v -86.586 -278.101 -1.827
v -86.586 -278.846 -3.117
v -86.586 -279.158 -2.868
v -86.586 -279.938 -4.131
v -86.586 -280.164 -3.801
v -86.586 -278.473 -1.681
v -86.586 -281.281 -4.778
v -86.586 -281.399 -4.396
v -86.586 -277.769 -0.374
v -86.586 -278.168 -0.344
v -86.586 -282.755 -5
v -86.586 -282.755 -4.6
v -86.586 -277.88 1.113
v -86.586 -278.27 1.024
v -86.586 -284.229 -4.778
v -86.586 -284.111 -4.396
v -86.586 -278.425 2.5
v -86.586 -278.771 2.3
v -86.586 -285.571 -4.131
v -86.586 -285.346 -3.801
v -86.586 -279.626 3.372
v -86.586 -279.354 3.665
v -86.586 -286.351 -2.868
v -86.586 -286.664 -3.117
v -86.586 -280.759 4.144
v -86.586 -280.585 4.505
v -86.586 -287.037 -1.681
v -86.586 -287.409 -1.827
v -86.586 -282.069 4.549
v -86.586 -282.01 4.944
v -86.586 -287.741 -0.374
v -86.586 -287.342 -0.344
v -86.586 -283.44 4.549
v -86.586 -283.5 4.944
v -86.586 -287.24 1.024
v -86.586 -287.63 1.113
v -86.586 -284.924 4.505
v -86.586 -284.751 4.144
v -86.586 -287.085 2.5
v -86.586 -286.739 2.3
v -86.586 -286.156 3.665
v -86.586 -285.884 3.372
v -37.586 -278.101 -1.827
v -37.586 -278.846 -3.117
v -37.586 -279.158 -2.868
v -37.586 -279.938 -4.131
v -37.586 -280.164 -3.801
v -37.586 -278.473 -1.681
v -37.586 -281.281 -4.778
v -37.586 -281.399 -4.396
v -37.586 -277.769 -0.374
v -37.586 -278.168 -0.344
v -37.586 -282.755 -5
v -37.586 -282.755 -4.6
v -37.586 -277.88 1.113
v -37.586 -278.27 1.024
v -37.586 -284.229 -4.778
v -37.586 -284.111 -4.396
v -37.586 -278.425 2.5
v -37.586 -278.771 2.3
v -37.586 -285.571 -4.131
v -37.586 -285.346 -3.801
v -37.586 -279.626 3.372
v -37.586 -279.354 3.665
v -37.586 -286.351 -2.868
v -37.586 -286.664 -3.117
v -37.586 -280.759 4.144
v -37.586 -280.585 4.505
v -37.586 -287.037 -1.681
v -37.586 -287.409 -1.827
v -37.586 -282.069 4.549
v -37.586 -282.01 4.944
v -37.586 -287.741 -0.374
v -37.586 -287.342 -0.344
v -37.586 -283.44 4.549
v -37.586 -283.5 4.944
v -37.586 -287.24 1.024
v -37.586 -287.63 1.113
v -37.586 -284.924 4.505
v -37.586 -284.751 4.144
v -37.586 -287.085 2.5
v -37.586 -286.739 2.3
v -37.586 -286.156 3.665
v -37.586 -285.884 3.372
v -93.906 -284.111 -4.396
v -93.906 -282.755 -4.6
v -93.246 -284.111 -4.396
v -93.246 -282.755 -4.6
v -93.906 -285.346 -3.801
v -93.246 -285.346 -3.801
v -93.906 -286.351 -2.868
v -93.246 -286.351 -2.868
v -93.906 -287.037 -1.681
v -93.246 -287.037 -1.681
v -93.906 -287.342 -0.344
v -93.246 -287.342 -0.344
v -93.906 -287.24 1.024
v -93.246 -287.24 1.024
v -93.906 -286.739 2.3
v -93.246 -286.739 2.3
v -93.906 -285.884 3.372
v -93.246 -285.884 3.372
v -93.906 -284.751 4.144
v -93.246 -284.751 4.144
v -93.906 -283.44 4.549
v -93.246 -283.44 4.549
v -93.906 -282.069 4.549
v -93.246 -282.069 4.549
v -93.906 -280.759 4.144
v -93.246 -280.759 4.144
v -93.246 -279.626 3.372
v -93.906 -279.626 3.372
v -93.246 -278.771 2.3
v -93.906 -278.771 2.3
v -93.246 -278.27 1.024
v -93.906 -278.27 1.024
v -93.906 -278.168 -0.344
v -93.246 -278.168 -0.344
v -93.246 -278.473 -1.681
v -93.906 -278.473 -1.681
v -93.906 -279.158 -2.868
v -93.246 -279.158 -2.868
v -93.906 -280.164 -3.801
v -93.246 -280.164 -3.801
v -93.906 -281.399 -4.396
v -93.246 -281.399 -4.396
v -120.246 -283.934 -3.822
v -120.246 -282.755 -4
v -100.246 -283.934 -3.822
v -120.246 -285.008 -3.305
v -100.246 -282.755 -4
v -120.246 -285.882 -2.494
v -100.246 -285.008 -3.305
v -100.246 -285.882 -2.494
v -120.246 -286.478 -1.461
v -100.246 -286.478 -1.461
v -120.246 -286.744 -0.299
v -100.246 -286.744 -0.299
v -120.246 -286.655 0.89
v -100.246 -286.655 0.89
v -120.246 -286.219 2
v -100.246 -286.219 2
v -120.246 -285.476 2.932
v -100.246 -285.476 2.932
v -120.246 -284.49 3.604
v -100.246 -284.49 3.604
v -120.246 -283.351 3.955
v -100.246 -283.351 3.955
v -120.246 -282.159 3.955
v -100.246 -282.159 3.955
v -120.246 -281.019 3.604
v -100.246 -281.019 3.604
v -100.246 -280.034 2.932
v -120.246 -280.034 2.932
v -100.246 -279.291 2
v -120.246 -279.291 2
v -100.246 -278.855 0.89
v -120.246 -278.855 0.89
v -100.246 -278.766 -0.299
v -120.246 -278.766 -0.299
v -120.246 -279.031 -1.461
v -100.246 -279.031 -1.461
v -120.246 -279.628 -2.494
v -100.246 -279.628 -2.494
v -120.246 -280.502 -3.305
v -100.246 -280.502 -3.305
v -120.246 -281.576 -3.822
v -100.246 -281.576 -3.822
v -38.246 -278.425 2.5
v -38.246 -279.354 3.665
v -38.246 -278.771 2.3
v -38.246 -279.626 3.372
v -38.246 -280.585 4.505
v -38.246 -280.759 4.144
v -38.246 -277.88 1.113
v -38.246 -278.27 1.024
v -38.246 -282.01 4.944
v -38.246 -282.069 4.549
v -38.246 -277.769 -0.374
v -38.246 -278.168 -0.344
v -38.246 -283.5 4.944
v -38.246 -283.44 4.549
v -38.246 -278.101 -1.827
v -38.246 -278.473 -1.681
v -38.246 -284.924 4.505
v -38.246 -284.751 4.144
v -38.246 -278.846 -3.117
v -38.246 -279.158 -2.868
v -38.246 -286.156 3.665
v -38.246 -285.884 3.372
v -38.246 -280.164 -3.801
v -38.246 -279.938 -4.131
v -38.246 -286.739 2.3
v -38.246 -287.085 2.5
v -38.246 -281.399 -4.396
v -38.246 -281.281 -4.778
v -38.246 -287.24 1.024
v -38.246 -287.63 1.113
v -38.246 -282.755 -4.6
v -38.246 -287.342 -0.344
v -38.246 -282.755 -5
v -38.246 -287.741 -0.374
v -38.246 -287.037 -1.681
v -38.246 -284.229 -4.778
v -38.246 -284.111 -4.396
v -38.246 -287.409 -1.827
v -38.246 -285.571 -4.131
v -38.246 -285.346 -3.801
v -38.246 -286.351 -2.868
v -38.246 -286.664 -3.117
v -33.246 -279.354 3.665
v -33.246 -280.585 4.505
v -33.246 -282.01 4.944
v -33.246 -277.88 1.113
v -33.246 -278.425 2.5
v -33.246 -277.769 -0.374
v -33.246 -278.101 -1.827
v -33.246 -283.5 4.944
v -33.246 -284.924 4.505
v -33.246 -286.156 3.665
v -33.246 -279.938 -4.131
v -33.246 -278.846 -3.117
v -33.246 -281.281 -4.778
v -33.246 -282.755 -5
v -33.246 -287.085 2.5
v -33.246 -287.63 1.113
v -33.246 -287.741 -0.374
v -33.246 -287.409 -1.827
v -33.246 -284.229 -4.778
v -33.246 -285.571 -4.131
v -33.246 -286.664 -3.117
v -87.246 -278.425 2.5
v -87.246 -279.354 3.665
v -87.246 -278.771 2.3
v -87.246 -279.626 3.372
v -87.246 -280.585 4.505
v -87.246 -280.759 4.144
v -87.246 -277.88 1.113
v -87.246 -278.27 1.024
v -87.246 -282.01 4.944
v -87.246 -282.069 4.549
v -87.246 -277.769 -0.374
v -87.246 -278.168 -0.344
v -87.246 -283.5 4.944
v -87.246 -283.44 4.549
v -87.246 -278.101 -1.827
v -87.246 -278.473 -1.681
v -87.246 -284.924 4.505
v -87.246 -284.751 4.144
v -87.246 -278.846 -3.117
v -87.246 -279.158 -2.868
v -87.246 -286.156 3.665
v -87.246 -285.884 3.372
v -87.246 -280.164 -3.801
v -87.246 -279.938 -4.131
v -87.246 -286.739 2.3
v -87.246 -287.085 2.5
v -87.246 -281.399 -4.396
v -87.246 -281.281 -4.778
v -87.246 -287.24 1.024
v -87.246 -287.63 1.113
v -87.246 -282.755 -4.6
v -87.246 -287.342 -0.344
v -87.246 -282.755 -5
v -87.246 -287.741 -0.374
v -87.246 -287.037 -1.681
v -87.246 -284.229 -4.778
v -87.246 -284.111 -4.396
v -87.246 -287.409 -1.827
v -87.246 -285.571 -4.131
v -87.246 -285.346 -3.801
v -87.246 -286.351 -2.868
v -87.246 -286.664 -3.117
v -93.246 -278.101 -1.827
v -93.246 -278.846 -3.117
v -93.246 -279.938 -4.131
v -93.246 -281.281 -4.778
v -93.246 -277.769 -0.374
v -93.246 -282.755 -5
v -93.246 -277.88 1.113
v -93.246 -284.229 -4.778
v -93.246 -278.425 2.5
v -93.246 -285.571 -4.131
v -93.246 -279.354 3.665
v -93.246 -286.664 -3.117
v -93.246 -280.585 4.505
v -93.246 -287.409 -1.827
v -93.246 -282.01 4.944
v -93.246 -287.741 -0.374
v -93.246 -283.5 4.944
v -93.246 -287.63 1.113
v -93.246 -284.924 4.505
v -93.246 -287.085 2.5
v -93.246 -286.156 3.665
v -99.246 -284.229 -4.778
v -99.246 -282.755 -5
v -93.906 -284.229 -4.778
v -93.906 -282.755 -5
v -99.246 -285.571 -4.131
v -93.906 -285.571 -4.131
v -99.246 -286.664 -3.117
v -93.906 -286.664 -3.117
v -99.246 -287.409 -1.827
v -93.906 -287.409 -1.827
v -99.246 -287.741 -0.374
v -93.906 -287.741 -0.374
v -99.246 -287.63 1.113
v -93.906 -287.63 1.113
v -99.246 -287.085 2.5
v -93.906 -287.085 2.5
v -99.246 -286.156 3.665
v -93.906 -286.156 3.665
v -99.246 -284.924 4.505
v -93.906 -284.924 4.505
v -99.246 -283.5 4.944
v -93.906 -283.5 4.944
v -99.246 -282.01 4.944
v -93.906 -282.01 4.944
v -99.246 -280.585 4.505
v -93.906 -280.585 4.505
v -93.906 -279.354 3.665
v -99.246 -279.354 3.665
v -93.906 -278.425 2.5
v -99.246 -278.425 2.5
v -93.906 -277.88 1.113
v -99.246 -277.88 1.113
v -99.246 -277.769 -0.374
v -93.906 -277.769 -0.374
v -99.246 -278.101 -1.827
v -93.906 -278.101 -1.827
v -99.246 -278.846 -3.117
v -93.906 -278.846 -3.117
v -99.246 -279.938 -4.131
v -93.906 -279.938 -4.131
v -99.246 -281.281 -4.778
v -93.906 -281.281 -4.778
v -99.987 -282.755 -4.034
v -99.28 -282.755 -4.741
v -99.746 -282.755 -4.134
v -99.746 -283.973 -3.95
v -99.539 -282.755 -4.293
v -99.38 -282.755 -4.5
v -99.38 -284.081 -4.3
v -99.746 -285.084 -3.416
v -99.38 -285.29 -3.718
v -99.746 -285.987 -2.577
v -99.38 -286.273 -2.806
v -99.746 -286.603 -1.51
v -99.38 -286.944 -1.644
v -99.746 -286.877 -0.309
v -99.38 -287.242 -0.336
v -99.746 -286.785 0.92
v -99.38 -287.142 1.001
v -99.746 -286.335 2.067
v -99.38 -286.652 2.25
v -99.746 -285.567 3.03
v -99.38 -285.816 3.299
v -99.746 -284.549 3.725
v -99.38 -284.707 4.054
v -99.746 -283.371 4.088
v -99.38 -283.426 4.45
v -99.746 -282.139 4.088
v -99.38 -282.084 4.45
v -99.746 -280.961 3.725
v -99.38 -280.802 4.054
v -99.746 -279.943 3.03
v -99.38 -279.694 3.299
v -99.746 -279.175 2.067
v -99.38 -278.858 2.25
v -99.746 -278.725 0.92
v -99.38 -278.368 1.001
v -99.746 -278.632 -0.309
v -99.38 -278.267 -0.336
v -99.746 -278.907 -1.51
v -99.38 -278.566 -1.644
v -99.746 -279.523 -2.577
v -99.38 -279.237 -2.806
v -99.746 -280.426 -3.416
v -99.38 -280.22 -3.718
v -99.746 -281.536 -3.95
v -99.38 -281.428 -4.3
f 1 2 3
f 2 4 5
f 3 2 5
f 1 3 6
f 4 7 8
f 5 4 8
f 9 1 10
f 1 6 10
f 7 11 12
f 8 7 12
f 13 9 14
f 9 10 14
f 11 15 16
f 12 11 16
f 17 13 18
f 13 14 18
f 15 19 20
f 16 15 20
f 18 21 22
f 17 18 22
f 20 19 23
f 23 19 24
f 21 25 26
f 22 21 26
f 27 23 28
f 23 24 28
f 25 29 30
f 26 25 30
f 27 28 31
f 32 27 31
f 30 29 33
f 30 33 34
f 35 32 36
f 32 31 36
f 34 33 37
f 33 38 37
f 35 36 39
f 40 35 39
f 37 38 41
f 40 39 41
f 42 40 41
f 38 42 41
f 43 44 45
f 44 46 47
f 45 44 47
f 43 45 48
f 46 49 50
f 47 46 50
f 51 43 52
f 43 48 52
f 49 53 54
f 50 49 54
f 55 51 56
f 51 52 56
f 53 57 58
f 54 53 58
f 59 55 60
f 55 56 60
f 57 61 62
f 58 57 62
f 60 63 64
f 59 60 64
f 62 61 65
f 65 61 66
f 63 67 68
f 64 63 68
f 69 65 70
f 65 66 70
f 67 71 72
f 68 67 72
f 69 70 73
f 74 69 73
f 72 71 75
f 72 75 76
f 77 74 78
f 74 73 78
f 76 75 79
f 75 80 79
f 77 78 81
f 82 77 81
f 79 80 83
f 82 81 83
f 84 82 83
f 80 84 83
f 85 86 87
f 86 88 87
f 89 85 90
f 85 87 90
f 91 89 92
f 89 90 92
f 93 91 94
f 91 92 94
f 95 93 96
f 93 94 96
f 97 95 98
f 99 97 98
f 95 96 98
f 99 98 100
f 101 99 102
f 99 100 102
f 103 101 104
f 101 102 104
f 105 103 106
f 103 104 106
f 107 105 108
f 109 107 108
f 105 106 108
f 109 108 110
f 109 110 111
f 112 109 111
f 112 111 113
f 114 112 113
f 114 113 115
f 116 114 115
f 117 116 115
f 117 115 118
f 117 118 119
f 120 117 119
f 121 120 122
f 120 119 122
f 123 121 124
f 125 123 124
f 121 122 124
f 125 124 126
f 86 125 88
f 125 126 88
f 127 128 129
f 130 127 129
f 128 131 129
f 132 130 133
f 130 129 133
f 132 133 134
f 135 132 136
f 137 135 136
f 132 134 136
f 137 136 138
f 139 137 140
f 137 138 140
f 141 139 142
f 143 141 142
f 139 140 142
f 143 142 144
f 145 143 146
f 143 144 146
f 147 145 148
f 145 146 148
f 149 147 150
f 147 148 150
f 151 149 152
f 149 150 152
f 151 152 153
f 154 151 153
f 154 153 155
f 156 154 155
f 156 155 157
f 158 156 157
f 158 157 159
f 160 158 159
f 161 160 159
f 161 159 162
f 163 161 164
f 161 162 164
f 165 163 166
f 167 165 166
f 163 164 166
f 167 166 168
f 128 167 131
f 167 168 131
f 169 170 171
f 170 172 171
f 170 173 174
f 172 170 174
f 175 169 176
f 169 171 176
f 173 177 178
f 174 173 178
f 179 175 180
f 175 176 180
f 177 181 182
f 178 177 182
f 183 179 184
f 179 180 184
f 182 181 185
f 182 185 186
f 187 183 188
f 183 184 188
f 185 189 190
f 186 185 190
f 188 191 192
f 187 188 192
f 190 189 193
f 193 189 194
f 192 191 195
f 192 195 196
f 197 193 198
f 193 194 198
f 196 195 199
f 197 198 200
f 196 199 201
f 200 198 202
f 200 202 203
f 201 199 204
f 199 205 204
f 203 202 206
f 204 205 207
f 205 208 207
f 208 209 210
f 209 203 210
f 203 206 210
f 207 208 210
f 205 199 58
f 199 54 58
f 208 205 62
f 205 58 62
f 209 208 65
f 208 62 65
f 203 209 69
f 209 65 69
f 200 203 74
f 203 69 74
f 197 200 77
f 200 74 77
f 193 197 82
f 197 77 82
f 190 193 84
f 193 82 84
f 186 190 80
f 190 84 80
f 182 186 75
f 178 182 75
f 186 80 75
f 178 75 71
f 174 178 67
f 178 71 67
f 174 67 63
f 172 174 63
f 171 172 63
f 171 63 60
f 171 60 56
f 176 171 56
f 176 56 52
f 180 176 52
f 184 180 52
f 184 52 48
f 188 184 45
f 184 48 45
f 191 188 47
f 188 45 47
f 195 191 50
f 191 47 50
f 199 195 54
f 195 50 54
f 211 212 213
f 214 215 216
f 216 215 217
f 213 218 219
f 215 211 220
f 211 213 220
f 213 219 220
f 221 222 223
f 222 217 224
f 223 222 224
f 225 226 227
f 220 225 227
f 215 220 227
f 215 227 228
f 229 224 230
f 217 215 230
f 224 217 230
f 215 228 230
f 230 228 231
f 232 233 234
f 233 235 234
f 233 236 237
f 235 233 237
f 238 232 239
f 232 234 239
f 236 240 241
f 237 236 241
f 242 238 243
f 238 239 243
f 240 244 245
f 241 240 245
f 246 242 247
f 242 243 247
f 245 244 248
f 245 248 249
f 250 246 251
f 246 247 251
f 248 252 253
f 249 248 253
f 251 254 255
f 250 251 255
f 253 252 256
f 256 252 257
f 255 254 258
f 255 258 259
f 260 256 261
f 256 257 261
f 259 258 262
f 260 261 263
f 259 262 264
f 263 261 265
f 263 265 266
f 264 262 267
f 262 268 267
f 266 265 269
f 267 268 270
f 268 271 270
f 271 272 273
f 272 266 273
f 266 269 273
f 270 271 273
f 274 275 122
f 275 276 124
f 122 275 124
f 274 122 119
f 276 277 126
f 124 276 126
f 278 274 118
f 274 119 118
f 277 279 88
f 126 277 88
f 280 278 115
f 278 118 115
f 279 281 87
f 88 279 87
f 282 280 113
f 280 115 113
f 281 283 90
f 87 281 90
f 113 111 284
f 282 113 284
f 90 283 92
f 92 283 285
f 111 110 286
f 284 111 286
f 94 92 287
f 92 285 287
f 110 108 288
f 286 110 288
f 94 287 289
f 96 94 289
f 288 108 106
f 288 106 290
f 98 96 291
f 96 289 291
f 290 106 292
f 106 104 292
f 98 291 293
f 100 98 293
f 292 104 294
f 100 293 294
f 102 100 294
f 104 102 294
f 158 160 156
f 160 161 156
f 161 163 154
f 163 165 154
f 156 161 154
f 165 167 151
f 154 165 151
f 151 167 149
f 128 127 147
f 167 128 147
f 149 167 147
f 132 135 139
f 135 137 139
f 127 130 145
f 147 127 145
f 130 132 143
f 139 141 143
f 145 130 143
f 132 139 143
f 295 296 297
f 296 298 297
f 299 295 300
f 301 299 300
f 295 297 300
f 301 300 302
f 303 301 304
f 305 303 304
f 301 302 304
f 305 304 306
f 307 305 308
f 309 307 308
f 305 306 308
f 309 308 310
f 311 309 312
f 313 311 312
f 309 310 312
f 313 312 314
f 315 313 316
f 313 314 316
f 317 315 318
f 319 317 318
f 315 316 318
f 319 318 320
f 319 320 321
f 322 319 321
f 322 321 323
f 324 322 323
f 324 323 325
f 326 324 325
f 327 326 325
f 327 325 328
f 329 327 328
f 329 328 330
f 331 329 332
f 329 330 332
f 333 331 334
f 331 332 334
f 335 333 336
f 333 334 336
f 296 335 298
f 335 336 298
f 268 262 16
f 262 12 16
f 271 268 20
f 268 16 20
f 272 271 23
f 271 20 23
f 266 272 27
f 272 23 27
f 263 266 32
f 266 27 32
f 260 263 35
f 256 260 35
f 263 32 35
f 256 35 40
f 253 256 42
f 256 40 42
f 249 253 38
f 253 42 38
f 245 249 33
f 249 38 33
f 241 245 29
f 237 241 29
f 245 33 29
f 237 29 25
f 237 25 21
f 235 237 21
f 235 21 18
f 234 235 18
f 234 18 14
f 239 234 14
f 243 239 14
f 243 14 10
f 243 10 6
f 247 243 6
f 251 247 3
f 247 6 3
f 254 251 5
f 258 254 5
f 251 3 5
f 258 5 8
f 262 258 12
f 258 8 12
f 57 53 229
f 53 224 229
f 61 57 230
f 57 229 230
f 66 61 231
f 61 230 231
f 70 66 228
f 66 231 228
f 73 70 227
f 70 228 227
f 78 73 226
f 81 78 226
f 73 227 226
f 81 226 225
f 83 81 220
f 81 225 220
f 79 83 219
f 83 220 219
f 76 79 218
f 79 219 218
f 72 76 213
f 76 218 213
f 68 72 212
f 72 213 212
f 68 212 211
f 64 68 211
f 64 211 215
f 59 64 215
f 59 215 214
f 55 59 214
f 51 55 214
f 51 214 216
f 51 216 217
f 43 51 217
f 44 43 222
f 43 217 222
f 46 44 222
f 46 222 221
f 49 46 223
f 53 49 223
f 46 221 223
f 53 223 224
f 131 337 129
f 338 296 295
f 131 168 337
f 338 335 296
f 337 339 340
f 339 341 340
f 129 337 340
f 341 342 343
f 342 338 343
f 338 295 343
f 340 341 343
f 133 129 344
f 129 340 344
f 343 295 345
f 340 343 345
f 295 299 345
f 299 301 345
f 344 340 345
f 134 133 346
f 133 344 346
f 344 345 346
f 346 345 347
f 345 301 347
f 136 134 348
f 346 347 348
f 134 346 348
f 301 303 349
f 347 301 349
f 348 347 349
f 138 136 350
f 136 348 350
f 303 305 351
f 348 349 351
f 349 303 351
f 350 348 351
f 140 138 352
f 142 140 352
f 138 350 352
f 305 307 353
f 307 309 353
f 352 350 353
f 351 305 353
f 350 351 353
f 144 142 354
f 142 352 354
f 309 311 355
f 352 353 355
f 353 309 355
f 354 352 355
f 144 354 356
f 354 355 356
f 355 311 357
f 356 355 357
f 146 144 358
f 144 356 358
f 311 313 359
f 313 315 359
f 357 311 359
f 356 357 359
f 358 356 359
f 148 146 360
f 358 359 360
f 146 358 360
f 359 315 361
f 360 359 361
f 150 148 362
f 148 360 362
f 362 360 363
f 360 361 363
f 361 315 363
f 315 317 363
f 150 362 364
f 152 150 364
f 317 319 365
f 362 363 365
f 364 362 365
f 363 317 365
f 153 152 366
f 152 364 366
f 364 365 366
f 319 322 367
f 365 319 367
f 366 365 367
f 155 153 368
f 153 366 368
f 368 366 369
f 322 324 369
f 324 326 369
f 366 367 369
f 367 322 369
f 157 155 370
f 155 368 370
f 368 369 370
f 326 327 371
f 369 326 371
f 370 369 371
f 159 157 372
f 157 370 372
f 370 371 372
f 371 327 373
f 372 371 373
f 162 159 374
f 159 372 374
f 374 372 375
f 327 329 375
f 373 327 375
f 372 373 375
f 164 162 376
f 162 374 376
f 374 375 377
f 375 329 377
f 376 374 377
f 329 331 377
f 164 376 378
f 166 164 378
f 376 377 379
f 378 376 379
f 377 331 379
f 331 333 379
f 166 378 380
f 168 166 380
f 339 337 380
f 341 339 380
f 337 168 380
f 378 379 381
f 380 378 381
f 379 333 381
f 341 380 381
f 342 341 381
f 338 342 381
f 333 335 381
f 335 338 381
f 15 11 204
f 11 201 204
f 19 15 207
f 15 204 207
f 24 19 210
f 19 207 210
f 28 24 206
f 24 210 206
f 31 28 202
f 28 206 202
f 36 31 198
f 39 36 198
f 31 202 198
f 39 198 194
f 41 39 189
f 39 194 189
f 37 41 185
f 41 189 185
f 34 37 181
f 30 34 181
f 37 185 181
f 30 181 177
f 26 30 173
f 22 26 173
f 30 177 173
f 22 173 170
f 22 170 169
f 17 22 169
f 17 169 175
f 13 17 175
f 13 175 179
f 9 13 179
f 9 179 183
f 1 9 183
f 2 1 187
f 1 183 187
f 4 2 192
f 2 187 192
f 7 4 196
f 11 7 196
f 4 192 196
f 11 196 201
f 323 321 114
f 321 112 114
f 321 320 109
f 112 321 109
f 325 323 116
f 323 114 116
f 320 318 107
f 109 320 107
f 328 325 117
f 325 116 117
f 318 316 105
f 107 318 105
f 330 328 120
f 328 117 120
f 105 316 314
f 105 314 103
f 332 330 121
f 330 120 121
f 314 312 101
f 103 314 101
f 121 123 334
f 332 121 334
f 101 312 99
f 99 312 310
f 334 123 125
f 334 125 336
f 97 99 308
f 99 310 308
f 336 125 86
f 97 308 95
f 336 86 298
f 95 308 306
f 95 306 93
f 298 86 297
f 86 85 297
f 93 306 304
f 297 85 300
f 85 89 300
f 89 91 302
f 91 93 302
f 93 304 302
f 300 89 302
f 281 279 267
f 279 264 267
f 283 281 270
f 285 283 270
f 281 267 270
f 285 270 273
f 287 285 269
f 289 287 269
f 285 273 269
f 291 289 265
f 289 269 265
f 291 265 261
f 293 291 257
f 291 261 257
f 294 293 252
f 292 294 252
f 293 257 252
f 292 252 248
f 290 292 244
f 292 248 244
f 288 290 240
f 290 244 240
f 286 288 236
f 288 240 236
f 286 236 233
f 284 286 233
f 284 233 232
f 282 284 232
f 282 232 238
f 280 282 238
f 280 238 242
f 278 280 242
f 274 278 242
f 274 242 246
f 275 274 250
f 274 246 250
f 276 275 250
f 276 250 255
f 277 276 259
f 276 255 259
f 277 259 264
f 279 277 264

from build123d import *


with BuildPart() as part:
    # Sketch1 → Revolve1 (revolve)
    with BuildSketch(Plane(origin=(0, 0, 0), x_dir=(-1, 0, 0), z_dir=(0, 0, 1)), mode=Mode.PRIVATE) as revolve1_sk:
        with BuildLine():
            Line((93.245668053, 287.354869365), (93.245668053, 287.754869365))
            Line((93.245668053, 287.754869365), (87.245668053, 287.754869365))
            Line((87.245668053, 287.754869365), (87.245668053, 287.354869365))
            Line((87.245668053, 287.354869365), (86.585668053, 287.354869365))
            Line((86.585668053, 287.354869365), (86.585668053, 287.754869365))
            Line((86.585668053, 287.754869365), (38.245668053, 287.754869365))
            Line((38.245668053, 287.754869365), (38.245668053, 287.354869365))
            Line((38.245668053, 287.354869365), (37.585668053, 287.354869365))
            Line((37.585668053, 287.354869365), (37.585668053, 287.754869365))
            Line((37.585668053, 287.754869365), (33.245668053, 287.754869365))
            Line((33.245668053, 287.754869365), (33.245668053, 282.754869365))
            Line((33.245668053, 282.754869365), (120.245668053, 282.754869365))
            Line((120.245668053, 282.754869365), (120.245668053, 286.754869365))
            Line((120.245668053, 286.754869365), (100.245668053, 286.754869365))
            ThreePointArc((100.245668053, 286.754869365), (99.538561272, 287.047762584), (99.245668053, 287.754869365))
            Line((99.245668053, 287.754869365), (93.905668053, 287.754869365))
            Line((93.905668053, 287.754869365), (93.905668053, 287.354869365))
            Line((93.905668053, 287.354869365), (93.245668053, 287.354869365))
        make_face()
    revolve(revolve1_sk.sketch.rotate(Axis((-33.245668053, -282.754869365, 0), (-1, 0, 0)), 270), axis=Axis((-33.245668053, -282.754869365, 0), (-1, 0, 0)))


solid = part.part
